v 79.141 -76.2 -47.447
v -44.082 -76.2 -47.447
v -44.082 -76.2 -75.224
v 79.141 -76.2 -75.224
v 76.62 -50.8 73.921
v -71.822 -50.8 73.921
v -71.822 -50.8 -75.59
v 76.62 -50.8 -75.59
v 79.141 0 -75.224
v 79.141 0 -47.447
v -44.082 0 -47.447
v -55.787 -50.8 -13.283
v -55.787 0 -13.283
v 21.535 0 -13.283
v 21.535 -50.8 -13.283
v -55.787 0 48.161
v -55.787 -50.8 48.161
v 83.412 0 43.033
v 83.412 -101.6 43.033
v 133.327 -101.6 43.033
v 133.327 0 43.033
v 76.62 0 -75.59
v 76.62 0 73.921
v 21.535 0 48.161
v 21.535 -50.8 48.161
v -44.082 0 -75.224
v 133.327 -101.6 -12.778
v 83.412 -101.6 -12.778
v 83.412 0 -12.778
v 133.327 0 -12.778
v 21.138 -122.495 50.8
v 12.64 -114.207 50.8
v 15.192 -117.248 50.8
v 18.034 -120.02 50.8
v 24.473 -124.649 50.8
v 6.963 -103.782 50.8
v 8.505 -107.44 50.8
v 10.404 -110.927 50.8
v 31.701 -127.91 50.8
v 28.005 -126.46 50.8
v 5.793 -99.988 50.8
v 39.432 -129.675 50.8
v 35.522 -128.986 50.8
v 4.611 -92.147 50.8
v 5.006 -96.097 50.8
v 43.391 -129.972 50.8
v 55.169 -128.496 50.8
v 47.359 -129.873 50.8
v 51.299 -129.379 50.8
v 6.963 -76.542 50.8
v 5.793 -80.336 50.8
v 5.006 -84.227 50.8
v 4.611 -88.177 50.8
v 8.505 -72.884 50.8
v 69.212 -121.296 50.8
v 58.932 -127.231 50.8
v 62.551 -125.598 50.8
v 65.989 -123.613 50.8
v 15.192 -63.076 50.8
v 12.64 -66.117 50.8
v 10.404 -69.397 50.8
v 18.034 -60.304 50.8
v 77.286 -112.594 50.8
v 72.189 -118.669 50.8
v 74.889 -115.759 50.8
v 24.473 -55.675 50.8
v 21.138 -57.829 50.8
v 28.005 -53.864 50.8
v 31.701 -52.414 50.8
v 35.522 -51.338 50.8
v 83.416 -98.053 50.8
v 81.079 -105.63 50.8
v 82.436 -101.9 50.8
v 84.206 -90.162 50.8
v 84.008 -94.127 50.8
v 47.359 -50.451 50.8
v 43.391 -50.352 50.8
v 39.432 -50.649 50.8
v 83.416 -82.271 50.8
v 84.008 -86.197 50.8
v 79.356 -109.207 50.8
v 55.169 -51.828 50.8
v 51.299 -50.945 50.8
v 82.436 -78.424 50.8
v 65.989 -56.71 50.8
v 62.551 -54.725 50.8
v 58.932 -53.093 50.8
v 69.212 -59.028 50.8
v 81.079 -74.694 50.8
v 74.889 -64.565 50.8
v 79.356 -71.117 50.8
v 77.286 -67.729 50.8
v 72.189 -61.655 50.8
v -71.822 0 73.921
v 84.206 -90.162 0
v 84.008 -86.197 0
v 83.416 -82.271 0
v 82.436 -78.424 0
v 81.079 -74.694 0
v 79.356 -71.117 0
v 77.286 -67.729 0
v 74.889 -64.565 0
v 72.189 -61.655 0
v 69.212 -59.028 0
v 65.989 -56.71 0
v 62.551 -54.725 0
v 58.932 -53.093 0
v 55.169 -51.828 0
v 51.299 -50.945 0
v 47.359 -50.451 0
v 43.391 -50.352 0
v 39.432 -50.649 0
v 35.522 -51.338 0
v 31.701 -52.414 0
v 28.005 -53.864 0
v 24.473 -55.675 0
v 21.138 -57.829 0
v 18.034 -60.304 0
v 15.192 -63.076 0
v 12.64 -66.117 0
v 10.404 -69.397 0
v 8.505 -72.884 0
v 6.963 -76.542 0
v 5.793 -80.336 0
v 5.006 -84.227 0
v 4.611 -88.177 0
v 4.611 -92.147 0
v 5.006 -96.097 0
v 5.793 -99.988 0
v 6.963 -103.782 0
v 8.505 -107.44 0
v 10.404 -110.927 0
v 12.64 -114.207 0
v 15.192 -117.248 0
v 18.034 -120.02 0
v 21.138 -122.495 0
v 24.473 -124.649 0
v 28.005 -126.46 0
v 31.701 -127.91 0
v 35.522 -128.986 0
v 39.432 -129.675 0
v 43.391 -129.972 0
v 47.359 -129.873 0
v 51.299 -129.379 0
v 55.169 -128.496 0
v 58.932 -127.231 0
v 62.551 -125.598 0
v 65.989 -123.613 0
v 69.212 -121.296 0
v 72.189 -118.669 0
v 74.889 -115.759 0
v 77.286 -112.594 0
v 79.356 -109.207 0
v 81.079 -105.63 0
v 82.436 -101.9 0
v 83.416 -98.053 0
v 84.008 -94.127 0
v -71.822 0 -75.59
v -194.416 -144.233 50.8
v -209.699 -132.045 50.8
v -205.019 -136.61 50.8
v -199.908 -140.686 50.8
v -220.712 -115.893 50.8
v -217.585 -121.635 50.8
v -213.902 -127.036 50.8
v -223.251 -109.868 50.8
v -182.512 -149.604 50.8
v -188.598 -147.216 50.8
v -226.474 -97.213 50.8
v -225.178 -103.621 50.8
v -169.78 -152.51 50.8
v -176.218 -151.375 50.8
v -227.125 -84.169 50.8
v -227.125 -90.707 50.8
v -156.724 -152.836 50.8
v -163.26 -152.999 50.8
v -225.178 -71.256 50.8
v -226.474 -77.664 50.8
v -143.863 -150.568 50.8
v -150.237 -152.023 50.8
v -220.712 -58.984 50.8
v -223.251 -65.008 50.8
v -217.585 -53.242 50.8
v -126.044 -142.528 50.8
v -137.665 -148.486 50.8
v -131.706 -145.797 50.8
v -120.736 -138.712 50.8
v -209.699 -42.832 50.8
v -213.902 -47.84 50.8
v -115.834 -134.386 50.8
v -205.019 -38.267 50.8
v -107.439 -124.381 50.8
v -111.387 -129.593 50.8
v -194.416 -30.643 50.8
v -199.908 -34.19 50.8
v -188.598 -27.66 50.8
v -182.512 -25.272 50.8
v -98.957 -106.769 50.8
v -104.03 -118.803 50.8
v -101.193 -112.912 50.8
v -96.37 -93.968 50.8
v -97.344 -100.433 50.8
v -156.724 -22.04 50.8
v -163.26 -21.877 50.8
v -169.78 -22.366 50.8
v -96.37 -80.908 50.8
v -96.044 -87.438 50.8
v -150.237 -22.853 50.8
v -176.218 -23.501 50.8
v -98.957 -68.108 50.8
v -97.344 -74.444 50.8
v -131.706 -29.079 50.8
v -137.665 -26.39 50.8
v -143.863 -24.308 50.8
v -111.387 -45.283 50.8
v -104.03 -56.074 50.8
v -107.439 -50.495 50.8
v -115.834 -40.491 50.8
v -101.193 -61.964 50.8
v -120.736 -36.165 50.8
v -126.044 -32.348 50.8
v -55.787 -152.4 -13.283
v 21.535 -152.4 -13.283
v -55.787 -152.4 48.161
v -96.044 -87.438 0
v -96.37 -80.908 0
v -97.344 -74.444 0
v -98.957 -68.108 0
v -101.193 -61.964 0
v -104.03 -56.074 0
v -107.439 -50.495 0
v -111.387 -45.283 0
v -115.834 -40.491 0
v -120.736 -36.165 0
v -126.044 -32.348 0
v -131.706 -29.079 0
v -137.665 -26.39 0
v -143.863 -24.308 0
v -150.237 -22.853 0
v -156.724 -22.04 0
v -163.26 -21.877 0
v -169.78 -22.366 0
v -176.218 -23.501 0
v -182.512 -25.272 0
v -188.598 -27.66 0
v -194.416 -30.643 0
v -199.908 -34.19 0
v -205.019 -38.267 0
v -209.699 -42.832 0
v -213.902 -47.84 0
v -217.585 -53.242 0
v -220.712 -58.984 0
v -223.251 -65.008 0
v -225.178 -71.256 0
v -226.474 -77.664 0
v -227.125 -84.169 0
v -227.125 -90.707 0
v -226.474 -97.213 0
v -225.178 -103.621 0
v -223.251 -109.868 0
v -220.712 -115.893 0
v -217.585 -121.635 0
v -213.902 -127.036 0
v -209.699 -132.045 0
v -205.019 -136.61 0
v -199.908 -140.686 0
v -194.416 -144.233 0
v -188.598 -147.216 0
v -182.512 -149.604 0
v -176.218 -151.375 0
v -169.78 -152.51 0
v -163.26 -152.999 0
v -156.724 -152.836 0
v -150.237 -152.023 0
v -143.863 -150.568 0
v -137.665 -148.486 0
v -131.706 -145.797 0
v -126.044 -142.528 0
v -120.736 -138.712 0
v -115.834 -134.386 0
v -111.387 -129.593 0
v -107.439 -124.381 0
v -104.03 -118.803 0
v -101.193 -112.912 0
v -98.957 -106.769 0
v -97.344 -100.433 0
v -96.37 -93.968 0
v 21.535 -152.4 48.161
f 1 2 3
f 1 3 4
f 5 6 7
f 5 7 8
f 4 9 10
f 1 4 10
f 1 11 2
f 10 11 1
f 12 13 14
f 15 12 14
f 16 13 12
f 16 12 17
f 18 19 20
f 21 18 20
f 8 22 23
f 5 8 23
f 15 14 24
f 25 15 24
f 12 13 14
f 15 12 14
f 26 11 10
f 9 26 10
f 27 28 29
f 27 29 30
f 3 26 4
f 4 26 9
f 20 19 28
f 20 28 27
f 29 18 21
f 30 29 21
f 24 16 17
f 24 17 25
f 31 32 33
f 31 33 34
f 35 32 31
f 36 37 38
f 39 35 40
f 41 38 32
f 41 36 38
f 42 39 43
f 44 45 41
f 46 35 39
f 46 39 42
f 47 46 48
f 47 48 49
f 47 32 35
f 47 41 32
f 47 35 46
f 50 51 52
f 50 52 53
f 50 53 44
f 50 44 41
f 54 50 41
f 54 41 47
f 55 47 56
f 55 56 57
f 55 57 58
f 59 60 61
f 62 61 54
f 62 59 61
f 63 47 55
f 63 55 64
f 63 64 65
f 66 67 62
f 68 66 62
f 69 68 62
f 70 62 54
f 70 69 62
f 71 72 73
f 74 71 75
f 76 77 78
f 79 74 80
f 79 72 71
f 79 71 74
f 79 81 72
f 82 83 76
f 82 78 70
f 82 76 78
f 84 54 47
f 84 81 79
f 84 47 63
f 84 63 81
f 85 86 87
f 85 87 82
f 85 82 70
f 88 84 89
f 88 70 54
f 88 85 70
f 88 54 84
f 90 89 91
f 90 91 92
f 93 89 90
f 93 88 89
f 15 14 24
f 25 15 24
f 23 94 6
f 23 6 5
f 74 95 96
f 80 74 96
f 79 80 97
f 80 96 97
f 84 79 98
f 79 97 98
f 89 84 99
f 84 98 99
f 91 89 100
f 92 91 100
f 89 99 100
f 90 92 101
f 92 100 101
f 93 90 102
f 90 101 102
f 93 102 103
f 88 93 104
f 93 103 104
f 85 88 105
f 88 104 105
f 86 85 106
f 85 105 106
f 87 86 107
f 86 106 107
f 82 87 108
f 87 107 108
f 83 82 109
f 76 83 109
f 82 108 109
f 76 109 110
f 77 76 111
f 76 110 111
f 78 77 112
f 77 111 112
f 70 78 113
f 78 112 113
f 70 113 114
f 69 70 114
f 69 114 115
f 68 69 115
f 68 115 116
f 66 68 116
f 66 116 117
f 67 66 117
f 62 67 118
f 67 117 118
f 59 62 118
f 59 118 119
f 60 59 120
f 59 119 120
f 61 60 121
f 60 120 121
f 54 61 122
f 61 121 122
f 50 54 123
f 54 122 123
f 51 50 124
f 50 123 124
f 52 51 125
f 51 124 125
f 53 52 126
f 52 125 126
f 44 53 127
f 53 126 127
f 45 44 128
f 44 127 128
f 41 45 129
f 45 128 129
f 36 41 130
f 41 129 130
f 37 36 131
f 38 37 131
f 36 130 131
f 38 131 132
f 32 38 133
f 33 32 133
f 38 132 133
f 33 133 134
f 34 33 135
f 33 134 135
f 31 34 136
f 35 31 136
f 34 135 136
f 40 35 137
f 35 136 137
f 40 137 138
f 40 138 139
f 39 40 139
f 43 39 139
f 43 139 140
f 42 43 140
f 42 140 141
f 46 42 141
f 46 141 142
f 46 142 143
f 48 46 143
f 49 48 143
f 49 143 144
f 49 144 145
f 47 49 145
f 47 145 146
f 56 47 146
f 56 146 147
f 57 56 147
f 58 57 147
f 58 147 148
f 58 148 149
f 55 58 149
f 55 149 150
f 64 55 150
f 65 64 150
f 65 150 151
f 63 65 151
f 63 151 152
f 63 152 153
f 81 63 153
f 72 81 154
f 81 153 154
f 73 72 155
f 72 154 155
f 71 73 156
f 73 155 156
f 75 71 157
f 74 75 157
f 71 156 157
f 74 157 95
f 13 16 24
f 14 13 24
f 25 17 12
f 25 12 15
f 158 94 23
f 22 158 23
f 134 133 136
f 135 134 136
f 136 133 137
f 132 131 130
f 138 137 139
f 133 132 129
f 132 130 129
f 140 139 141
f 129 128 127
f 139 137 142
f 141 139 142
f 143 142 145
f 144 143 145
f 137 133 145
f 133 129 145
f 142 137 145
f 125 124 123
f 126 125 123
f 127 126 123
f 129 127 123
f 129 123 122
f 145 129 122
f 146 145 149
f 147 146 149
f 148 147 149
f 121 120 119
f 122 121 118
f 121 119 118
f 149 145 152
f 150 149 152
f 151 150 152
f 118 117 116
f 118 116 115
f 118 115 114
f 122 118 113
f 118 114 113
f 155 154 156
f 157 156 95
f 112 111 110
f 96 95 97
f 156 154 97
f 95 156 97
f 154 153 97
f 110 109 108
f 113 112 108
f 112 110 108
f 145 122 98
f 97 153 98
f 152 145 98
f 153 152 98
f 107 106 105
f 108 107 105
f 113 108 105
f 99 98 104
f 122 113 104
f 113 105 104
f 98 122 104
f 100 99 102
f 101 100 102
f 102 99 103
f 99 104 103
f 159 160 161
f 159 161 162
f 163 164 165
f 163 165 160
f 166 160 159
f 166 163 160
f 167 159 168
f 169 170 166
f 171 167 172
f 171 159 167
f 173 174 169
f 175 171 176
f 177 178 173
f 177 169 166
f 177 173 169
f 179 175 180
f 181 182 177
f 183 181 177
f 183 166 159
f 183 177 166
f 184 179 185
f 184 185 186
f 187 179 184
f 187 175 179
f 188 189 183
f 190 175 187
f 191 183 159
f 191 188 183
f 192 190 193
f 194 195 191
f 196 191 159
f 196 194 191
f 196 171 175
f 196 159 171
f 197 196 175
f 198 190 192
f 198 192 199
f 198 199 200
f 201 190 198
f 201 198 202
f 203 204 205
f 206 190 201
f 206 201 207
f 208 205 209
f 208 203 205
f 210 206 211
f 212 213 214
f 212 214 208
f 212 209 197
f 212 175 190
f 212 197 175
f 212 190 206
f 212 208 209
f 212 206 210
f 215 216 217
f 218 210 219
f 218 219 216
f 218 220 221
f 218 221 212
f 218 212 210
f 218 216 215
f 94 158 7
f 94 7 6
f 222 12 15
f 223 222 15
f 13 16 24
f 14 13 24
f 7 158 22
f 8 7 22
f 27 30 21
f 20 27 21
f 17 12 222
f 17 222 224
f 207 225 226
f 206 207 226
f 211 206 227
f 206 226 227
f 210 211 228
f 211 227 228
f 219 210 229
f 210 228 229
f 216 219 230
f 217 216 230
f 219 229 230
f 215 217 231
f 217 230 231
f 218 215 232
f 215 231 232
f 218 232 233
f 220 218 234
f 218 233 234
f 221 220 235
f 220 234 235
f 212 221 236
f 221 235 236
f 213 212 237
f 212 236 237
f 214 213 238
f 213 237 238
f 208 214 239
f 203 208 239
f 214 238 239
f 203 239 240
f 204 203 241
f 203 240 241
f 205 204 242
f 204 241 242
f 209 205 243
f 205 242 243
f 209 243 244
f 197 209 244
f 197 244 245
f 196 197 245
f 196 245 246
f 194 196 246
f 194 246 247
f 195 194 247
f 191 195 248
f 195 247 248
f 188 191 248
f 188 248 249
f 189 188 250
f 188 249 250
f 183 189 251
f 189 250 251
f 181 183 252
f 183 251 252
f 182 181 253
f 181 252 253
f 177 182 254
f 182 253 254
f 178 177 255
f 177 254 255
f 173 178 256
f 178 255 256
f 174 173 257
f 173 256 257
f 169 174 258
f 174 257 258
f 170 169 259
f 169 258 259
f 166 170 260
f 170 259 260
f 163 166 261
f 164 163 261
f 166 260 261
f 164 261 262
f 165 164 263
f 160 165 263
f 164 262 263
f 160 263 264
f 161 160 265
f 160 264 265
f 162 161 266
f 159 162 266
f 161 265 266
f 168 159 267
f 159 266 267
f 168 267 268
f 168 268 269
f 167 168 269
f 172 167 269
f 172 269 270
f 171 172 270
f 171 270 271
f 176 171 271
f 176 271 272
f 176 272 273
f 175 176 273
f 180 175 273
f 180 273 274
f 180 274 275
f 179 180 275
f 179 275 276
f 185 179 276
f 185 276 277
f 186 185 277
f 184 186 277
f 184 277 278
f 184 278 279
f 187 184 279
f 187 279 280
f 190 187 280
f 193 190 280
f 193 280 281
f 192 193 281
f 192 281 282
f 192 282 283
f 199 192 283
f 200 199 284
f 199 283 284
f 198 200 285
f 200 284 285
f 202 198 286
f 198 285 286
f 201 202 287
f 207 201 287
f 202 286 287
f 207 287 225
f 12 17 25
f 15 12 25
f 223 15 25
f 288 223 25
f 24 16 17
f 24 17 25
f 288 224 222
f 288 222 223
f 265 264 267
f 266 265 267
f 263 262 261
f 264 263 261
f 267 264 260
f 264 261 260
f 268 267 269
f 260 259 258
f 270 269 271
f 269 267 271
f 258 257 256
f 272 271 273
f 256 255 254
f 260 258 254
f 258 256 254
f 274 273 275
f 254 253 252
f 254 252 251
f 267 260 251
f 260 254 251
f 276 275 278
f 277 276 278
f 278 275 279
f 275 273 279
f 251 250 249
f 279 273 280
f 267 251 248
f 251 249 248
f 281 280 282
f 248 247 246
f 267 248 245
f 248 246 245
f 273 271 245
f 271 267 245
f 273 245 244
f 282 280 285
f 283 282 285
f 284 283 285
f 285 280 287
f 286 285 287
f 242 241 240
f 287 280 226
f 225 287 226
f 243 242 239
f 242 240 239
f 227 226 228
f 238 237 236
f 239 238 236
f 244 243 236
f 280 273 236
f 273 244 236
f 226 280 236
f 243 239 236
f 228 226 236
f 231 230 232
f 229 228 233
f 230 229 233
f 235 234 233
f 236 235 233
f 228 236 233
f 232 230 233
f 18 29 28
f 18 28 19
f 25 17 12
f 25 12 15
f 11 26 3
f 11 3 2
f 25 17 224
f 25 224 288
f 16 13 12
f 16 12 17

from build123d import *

# Parameters (mm, degrees)
F0_W      = 77.3211158812
F0_H      = 61.4438680932
F1_DEPTH  = 50.8
F2_W      = 49.9155819416
F2_H      = 55.8106014505
F3_DEPTH  = 101.6
F4_W      = 123.2228167355
F4_H      = 27.7765095234
F5_DEPTH  = 76.2
F6_W      = 148.441709578
F6_H      = 149.5107635856
F7_DEPTH  = 50.8
F8_DEPTH  = 101.6
F9_R      = 65.5812572733
F10_DEPTH = 50.8
F11_DEPTH = 50.8
F14_R     = 39.8220041085
F15_DEPTH = 50.8


# Not quite as in the source:
# - the program builds the solid bodies; features that only make, move or delete a surface that nothing else refers to are left out


with BuildPart() as f1:
    # F0 (on Front) → F1 (new body)
    with BuildSketch(Plane.XZ):
        with Locations((-17.1259511262, 17.4385928549)):
            Rectangle(F0_W, F0_H)
    extrude(amount=F1_DEPTH)


with BuildPart() as f3:
    # F2 (on Front) → F3 (new body)
    with BuildSketch(Plane.XZ):
        with Locations((108.3693355322, 15.127654653)):
            Rectangle(F2_W, F2_H)
    extrude(amount=F3_DEPTH)


with BuildPart() as f5:
    # F4 (on Front) → F5 (new body)
    with BuildSketch(Plane.XZ):
        with Locations((17.5292175263, -61.3352879882)):
            Rectangle(F4_W, F4_H)
    extrude(amount=F5_DEPTH)


with BuildPart() as f7:
    # F6 (on Front) → F7 (new body)
    with BuildSketch(Plane.XZ):
        with Locations((2.3990385234, -0.8346028626)):
            Rectangle(F6_W, F6_H)
    extrude(amount=F7_DEPTH)


with BuildPart() as f8:
    # F8 (new): a face of the model
    f8_faces = [f1.part.faces().sort_by_distance(p)[0] for p in [
        (-17.1259511262, -50.8, 17.4385928549),
    ]]
    extrude(f8_faces, amount=F8_DEPTH)


with BuildPart() as f10:
    # F9 (on Top) → F10 (new body)
    with BuildSketch(Plane.XY):
        with Locations((-161.6249978542, -87.4381959438)):
            Circle(F9_R)
    extrude(amount=F10_DEPTH)


with BuildPart() as f11:
    # F0 (on Front) → F11 (new body)
    with BuildSketch(Plane.XZ):
        with Locations((-17.1259511262, 17.4385928549)):
            Rectangle(F0_W, F0_H)
    extrude(amount=F11_DEPTH)


with BuildPart() as f15:
    # F14 (on Top) → F15 (new body)
    with BuildSketch(Plane.XY):
        with Locations((44.3835146725, -90.1619270444)):
            Circle(F14_R)
    extrude(amount=F15_DEPTH)


solid = Compound([f1.part, f3.part, f5.part, f7.part, f8.part, f10.part, f11.part, f15.part])
